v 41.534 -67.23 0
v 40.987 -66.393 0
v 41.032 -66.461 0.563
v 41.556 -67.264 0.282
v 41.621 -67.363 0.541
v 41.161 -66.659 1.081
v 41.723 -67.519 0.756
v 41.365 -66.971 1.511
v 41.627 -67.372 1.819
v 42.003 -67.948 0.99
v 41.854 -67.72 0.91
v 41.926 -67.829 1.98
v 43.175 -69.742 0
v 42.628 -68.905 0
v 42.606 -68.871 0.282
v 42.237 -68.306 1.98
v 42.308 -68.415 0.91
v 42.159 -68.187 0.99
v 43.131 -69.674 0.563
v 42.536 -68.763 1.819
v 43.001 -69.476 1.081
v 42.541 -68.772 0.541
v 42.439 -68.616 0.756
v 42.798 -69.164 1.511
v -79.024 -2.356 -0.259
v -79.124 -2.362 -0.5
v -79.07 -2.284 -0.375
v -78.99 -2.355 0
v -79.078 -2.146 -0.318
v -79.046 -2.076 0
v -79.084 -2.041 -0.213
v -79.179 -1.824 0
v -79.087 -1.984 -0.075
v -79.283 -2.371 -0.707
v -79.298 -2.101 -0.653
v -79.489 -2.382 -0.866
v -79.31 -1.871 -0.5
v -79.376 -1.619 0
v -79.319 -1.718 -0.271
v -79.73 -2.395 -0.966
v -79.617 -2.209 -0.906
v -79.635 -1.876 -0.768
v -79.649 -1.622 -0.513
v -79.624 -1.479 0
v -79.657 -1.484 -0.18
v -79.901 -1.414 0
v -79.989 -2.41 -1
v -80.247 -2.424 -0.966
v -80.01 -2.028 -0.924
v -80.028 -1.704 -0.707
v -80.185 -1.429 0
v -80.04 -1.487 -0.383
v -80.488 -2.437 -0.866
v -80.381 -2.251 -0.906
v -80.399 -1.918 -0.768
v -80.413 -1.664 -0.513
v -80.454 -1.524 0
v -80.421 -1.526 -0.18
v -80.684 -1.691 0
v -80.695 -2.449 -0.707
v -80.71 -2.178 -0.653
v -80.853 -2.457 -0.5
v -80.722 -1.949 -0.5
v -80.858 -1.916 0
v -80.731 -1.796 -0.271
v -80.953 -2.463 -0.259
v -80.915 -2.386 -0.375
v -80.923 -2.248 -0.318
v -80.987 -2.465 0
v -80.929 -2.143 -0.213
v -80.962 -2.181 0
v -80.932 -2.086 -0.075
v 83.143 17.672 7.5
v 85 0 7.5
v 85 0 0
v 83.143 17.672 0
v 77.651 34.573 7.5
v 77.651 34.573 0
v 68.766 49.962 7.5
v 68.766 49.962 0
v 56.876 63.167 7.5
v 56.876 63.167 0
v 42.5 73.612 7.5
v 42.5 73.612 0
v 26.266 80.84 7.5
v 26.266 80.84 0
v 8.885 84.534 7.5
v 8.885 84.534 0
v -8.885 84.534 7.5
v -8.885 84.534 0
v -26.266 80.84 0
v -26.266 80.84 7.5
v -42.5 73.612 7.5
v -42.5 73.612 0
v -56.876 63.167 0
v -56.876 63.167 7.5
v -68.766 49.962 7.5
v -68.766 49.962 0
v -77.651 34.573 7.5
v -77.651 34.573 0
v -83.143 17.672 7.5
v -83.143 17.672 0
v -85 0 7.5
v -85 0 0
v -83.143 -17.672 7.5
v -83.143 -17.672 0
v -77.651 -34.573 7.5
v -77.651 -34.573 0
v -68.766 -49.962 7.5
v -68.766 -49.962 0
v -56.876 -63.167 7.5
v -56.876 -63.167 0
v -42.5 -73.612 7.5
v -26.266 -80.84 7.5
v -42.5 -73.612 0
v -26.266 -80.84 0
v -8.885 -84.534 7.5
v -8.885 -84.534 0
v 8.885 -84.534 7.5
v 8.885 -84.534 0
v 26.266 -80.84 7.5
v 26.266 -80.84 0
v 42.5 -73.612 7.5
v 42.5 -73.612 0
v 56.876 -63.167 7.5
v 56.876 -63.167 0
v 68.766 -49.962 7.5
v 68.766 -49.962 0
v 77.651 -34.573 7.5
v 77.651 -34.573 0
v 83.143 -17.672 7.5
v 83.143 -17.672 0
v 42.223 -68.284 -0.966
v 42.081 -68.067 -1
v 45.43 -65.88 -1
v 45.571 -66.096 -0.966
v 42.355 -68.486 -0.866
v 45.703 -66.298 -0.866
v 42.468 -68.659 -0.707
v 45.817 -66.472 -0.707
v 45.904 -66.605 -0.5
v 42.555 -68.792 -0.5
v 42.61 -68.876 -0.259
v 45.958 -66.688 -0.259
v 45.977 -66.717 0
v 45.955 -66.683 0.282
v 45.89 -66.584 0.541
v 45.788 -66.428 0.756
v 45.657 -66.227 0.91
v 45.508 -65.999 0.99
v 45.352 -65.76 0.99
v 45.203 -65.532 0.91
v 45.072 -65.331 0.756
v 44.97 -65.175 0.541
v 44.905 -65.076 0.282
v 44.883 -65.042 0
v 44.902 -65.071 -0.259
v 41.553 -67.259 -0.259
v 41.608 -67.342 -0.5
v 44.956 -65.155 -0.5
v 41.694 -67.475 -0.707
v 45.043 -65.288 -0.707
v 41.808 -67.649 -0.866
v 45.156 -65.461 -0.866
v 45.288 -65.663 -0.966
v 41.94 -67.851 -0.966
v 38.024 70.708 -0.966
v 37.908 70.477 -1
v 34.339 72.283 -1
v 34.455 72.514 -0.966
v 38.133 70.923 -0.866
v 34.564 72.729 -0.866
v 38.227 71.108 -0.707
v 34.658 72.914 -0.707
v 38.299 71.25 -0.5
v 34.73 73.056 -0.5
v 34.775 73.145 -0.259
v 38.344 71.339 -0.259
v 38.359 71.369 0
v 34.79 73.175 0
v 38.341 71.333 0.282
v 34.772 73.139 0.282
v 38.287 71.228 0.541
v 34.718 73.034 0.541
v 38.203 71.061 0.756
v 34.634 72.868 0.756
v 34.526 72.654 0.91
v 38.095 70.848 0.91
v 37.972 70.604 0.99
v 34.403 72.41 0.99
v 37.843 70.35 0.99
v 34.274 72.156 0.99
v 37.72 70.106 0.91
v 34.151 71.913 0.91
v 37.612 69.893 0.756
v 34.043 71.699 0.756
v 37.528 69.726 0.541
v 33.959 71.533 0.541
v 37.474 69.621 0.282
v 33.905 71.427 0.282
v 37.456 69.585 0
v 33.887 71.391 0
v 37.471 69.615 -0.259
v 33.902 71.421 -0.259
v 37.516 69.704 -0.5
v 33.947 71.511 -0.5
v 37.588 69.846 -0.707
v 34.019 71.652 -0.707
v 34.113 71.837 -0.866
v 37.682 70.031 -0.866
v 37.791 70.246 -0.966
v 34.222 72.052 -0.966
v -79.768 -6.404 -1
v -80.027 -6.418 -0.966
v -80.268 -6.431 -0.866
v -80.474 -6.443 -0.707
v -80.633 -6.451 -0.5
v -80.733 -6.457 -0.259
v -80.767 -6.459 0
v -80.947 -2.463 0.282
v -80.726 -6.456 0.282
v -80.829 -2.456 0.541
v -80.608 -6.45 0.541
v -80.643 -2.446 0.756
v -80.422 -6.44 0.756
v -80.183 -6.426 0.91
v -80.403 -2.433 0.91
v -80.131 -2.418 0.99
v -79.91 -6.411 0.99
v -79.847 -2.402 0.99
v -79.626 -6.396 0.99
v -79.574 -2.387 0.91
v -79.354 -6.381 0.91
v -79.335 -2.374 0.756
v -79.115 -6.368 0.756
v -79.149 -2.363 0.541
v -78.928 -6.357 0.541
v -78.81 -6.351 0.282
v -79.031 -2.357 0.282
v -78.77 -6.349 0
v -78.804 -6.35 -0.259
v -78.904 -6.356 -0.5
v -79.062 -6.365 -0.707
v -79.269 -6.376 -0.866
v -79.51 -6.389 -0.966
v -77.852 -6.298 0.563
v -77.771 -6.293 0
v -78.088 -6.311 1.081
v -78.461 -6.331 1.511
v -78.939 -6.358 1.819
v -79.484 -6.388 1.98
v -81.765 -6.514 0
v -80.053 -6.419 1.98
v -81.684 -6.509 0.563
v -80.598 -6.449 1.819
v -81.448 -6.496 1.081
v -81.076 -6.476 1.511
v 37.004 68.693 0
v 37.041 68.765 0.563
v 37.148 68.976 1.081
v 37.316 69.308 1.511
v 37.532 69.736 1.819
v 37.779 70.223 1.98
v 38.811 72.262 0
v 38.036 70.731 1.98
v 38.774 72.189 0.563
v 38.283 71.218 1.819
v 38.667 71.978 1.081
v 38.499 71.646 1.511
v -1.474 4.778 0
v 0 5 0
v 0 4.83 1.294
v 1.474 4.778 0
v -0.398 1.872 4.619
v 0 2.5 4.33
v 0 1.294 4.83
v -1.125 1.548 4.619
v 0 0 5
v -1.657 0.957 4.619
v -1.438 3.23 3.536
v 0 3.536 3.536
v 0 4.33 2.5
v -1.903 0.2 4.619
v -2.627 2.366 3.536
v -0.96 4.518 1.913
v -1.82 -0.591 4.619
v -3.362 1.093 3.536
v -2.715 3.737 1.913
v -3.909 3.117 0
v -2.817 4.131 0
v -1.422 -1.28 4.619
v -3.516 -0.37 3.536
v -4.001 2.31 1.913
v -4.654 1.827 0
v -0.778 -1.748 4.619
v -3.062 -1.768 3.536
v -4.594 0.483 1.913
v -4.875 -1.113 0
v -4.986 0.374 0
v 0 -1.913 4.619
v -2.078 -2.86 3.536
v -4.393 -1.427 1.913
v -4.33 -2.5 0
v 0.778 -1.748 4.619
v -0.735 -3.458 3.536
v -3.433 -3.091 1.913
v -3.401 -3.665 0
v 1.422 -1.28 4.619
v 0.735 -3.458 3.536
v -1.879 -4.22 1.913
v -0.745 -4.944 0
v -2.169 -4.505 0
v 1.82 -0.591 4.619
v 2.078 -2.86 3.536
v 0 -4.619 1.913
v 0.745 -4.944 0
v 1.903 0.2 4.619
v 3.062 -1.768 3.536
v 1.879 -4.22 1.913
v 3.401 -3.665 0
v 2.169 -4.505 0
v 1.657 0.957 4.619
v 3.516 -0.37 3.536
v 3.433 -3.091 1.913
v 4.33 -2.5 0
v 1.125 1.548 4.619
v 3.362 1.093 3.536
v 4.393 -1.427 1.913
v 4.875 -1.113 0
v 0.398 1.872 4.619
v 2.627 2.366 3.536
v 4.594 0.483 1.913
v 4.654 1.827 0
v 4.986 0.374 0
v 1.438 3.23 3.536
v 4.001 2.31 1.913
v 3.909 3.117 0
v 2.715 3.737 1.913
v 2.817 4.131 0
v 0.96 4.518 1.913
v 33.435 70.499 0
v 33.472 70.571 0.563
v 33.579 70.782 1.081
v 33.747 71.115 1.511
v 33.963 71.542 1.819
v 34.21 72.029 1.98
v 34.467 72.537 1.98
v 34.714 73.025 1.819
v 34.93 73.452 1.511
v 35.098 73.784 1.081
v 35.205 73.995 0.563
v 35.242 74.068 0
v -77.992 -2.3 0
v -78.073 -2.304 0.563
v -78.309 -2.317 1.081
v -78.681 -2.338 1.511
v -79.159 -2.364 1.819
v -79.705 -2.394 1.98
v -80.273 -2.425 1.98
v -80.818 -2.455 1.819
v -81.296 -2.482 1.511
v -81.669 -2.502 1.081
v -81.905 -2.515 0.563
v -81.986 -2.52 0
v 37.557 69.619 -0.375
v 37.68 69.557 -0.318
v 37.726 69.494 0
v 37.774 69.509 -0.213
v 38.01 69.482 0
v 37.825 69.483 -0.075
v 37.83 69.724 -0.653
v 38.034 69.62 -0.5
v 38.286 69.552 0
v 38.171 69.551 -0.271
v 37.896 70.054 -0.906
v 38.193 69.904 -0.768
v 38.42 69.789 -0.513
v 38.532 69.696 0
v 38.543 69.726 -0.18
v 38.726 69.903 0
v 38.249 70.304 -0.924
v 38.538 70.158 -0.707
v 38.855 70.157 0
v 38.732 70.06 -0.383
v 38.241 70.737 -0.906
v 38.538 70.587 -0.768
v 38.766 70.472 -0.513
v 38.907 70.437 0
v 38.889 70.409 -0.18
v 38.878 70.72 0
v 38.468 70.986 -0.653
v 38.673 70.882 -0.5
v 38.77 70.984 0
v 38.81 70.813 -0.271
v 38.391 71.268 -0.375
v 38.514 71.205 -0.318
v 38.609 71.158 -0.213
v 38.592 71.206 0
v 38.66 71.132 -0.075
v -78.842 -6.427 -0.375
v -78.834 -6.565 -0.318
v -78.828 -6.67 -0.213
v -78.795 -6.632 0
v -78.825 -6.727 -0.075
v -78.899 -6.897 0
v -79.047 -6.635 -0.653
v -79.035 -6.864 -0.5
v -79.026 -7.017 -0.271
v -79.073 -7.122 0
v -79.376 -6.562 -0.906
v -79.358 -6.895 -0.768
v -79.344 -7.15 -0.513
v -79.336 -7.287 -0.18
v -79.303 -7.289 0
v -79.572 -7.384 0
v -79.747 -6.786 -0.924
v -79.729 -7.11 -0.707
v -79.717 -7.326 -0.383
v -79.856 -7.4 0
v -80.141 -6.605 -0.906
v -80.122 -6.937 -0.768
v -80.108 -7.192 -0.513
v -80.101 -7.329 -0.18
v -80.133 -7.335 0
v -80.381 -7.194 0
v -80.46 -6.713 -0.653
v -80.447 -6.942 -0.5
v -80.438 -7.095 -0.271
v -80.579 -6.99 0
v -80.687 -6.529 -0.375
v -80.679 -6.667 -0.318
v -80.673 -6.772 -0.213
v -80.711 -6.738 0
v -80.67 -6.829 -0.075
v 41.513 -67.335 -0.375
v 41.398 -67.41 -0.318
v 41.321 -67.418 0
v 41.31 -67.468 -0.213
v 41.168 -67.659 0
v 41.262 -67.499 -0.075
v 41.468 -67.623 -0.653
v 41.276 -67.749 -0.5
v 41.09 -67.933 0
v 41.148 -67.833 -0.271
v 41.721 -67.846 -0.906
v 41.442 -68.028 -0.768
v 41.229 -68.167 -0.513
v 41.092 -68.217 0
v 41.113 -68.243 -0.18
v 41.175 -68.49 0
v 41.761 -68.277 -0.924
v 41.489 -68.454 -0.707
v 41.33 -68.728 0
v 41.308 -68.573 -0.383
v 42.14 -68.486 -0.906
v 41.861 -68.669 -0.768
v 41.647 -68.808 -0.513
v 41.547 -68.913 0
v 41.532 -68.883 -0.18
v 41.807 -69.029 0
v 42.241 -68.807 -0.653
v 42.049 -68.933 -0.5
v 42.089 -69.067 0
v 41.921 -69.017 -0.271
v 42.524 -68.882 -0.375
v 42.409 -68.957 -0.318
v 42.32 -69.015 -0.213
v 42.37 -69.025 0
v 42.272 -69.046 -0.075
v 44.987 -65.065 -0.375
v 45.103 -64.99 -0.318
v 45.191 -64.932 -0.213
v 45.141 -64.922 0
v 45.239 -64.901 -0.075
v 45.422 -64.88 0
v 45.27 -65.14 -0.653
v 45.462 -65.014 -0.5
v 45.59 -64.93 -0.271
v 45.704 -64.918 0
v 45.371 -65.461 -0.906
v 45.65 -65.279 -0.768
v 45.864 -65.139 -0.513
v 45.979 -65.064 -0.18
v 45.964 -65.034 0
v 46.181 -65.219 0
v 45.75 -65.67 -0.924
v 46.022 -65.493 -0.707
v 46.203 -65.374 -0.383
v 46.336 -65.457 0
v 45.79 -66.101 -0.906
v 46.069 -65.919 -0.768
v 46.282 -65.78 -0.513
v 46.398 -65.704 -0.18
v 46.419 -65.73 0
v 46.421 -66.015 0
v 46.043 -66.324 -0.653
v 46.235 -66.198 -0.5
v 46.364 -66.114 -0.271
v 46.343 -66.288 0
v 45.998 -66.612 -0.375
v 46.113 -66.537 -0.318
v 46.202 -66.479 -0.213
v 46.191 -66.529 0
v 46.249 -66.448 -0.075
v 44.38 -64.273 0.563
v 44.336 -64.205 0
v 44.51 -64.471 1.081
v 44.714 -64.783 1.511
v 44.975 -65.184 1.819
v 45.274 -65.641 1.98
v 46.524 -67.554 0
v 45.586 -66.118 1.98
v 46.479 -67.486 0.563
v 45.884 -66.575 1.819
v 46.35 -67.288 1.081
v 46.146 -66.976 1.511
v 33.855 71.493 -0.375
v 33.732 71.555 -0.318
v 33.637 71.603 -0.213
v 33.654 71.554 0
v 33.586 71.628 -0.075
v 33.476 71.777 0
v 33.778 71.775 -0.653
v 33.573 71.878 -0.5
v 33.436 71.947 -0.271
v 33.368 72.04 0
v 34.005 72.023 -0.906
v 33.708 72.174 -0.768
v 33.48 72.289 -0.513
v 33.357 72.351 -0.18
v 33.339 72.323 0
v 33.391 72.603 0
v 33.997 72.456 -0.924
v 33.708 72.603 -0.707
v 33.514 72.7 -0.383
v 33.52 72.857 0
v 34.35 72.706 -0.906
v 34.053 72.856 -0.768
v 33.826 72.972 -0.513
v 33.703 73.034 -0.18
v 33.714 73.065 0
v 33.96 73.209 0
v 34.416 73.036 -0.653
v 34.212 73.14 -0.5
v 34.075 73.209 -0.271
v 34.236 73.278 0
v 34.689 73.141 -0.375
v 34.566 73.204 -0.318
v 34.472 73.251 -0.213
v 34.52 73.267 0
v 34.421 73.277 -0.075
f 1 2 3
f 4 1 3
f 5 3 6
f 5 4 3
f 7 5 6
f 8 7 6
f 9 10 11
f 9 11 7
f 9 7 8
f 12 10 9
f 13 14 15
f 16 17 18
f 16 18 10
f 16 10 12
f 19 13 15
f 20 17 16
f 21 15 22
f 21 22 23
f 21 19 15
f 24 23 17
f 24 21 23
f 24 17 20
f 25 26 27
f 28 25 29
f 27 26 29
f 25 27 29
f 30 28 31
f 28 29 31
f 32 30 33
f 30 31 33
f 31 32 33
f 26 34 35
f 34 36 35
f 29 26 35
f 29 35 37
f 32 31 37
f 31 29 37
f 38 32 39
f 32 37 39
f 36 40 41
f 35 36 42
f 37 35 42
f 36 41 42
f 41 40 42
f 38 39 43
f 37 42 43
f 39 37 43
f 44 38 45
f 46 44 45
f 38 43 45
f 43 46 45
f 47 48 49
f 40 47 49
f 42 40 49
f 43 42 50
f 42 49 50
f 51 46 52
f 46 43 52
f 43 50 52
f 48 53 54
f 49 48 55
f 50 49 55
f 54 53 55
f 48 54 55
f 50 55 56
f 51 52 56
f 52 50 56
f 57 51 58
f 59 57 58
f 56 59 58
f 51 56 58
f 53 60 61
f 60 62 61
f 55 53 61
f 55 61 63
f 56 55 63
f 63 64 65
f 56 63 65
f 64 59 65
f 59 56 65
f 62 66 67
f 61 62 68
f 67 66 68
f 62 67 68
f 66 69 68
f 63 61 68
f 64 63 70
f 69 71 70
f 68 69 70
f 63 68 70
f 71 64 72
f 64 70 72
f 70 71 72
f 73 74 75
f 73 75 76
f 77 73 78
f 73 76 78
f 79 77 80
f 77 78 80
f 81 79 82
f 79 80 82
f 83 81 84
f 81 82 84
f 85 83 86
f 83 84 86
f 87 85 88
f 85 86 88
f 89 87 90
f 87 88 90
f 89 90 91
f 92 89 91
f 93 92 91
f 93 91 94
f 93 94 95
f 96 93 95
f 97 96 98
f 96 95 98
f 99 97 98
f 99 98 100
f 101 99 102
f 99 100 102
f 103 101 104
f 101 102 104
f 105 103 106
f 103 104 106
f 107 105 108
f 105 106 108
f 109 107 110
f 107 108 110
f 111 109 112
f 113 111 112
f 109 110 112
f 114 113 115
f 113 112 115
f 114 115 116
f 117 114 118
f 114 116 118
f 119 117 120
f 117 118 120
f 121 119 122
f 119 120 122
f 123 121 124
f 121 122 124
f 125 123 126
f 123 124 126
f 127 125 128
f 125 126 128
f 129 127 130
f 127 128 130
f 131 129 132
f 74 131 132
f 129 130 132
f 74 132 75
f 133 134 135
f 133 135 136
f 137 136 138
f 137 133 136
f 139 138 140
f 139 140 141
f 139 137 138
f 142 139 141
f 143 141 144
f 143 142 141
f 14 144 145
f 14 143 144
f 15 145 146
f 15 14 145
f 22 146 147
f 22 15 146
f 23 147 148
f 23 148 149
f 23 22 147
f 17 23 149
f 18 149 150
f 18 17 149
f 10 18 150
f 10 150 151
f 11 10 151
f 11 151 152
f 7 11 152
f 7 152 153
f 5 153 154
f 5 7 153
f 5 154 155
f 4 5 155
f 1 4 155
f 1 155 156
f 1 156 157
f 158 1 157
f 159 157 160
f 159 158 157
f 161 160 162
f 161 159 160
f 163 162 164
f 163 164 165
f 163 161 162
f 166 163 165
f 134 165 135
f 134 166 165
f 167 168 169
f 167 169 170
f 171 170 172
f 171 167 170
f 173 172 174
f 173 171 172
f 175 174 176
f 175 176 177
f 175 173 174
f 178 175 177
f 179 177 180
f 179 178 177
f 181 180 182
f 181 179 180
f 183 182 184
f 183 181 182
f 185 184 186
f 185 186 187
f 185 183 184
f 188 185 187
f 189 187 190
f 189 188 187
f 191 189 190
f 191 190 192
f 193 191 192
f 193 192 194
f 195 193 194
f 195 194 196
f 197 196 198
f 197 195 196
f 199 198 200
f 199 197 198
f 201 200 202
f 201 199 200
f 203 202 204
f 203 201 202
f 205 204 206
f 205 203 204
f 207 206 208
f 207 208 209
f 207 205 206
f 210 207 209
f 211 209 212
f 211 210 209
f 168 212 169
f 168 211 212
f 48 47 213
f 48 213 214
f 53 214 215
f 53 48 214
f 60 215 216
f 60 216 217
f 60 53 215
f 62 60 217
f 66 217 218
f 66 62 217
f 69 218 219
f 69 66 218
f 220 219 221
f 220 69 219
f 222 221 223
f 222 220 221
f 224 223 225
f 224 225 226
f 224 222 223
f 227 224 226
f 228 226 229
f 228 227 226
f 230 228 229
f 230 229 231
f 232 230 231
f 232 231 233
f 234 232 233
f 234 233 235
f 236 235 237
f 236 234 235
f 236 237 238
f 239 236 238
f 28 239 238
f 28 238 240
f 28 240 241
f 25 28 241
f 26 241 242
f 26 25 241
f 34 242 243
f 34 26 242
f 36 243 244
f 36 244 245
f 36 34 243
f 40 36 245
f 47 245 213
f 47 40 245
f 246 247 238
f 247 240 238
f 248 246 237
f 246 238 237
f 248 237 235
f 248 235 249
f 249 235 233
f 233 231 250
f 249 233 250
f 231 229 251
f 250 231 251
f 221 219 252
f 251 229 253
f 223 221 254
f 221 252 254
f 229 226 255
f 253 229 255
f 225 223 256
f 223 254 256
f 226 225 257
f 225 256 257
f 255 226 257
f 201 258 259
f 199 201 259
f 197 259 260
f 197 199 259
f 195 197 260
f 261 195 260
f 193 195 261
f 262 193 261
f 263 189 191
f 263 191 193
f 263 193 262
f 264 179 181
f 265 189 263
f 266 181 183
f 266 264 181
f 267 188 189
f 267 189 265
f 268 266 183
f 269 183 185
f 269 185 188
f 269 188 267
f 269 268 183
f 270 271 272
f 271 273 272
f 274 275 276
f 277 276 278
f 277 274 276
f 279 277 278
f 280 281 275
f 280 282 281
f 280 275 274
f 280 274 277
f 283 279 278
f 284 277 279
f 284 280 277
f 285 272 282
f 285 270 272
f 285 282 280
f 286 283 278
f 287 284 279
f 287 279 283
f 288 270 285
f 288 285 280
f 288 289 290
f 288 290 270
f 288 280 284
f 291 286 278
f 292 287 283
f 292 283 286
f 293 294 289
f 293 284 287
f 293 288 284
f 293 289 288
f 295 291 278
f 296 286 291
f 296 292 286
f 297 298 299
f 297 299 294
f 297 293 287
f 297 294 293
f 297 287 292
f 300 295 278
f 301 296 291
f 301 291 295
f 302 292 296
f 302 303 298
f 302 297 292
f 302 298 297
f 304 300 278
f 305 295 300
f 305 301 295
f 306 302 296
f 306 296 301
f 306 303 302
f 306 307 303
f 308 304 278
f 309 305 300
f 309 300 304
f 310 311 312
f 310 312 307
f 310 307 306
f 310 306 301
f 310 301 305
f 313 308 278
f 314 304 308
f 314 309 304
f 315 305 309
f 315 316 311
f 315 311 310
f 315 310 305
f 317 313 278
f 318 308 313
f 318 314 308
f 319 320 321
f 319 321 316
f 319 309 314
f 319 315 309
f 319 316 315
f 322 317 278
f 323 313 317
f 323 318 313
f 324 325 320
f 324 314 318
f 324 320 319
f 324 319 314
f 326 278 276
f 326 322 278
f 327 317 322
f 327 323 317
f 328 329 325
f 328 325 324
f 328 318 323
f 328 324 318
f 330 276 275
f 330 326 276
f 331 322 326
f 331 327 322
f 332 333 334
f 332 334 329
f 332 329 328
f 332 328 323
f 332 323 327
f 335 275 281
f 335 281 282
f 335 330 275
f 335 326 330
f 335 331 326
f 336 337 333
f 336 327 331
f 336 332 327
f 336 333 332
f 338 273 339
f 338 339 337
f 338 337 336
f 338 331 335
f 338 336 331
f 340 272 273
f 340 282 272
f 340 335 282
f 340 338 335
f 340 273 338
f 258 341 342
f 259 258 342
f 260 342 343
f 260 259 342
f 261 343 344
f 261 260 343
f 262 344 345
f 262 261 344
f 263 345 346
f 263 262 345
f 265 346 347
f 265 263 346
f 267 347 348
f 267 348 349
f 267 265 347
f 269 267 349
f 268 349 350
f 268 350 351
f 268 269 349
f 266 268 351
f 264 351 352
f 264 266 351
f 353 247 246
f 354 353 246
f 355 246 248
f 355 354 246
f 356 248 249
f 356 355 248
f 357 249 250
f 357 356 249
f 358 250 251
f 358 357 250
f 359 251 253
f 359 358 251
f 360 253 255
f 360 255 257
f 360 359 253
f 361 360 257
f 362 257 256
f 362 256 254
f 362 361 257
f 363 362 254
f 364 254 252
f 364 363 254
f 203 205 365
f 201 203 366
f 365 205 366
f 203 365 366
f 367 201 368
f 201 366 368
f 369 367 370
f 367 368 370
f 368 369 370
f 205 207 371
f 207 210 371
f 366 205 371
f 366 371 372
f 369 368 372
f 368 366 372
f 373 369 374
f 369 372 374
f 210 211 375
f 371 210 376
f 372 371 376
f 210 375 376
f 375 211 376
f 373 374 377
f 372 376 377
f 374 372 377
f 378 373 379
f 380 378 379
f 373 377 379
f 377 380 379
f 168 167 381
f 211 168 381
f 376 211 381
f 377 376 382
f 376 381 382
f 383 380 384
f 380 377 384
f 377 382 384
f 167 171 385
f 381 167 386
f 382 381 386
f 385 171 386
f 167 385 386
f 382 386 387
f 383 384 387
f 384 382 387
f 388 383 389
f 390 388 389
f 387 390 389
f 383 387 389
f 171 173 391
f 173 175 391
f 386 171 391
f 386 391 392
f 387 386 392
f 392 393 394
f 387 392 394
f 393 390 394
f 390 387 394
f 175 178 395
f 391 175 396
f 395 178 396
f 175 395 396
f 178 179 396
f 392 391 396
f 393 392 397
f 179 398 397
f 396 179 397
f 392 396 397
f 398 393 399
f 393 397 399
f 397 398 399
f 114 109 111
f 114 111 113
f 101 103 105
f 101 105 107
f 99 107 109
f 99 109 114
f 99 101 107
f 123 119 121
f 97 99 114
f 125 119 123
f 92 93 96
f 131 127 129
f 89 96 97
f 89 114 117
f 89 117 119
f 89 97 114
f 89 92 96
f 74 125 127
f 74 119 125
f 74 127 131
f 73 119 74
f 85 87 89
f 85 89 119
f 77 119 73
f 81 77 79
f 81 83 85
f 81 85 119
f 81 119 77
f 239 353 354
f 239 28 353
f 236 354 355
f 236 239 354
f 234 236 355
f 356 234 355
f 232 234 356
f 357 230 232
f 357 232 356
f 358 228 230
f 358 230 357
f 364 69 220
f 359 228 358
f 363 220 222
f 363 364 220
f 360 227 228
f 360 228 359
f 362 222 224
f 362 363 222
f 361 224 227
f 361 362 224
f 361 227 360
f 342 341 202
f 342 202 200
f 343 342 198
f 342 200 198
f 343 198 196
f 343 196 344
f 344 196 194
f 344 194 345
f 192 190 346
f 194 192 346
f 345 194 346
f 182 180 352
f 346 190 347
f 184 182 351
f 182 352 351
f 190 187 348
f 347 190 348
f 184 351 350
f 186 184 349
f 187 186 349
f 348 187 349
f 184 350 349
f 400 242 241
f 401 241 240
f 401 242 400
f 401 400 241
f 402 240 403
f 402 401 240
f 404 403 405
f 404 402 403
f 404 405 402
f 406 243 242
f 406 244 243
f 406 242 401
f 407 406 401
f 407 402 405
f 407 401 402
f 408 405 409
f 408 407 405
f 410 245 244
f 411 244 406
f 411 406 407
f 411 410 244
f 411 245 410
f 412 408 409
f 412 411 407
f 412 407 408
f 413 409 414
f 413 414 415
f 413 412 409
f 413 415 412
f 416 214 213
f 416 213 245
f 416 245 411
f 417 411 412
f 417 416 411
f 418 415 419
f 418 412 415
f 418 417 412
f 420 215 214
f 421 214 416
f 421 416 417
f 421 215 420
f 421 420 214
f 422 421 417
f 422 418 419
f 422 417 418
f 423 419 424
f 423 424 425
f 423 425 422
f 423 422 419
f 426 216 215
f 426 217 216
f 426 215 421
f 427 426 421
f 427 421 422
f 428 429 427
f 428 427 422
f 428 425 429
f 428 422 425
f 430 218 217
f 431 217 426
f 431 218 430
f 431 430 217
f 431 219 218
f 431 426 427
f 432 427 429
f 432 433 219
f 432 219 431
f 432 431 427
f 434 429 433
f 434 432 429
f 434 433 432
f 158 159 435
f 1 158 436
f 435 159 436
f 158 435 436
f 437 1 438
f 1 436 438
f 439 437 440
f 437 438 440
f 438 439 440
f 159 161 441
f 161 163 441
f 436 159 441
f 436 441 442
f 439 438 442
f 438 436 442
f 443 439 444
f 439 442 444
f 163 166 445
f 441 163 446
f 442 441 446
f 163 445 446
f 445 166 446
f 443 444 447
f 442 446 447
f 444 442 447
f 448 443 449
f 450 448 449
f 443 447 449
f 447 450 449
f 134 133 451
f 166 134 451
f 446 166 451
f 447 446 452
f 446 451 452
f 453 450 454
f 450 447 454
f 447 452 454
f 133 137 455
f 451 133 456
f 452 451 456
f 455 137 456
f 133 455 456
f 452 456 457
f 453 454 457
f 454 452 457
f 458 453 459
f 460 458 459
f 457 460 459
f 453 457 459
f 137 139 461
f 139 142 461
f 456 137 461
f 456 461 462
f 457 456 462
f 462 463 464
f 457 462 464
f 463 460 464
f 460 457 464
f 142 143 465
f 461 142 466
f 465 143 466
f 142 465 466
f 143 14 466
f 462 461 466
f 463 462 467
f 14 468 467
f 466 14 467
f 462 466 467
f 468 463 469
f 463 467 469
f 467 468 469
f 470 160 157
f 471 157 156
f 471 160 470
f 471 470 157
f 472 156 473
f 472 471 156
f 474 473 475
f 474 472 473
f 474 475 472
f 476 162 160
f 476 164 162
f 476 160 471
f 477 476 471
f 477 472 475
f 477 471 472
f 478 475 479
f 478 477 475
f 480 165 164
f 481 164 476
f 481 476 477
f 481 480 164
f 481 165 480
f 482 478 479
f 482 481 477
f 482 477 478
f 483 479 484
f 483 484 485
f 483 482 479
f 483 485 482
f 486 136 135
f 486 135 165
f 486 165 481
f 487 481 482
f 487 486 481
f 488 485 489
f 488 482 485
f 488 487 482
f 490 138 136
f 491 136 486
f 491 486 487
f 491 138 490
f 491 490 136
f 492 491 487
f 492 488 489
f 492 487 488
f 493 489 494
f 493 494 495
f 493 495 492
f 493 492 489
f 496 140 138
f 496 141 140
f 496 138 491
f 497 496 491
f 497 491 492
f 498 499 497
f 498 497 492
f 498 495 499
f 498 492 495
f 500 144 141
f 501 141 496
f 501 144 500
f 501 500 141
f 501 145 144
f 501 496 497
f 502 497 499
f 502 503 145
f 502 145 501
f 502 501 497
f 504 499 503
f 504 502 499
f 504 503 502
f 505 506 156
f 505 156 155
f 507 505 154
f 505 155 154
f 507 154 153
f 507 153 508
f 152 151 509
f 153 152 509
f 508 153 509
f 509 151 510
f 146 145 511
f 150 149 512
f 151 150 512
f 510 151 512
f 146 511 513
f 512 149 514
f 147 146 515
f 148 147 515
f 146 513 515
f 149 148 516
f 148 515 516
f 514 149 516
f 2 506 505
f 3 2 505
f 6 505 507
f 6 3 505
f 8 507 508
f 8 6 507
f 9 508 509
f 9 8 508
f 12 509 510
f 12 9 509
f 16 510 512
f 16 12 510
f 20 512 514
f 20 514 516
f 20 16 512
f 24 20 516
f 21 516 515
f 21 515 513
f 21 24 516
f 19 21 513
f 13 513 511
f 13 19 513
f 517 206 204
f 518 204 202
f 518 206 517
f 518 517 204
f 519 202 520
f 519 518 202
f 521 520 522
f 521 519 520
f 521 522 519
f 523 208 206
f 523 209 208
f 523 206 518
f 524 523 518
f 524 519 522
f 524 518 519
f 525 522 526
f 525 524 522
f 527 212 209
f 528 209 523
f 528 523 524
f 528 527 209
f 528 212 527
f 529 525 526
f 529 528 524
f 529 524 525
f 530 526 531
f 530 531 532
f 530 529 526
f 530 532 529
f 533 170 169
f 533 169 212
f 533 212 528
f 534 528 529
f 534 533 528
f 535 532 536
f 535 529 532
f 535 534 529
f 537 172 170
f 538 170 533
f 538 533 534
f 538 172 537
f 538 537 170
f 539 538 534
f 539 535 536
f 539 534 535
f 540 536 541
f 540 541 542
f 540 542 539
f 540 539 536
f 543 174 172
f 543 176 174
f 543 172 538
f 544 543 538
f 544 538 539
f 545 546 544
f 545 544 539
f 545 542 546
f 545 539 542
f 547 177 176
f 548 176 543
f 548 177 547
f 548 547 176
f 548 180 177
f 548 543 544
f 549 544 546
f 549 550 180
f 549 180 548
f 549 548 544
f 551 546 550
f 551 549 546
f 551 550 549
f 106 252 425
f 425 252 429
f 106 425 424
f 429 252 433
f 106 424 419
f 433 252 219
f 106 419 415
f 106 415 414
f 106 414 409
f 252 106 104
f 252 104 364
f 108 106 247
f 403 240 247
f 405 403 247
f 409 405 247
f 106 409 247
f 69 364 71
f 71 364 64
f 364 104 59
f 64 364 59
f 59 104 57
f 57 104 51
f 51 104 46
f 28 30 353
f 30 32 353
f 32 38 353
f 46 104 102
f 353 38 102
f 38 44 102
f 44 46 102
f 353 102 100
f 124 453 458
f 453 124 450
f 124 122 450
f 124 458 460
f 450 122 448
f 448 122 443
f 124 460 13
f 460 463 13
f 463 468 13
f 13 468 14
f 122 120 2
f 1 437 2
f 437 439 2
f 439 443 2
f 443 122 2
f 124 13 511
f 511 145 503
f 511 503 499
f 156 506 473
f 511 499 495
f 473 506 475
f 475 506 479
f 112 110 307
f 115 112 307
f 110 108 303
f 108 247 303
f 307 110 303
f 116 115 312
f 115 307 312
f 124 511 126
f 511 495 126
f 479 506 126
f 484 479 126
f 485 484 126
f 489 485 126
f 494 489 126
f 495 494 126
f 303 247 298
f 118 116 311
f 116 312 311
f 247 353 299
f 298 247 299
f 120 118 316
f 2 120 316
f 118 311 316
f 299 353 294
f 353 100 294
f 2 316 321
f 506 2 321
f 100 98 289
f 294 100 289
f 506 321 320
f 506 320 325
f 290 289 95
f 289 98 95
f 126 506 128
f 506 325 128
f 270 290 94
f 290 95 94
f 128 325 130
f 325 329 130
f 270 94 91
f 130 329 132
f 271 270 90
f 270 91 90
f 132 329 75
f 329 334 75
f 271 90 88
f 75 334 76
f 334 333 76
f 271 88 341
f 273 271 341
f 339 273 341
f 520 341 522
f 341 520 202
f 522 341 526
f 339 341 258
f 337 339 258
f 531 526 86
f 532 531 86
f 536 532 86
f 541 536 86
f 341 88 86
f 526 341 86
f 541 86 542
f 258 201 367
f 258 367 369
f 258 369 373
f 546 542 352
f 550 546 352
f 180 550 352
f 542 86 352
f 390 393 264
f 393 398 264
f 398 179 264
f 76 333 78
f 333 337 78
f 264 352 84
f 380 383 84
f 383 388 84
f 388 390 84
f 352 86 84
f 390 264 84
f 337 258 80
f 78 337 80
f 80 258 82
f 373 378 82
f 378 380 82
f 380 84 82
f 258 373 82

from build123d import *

# Parameters (mm, degrees)
SKETCH1_R                = 85
BOSS_EXTRUDE1_DEPTH      = 7.5
CUT_EXTRUDE1_DEPTH       = 2
SKETCH4_R                = 1
BOSS_EXTRUDE2_DEPTH      = 2
REVOLVE1_ANGLE           = 90
CIRPATTERN1_COUNT        = 3
CIRPATTERN1_COPY_1_ANGLE = 90
CIRPATTERN1_COPY_2_ANGLE = 90


with BuildPart() as part:
    # Sketch1 → Boss-Extrude1 (new body)
    with BuildSketch(Plane.XY):
        Circle(SKETCH1_R)
    extrude(amount=BOSS_EXTRUDE1_DEPTH)

    # Sketch3 → Cut-Extrude1 (cut, symmetric)
    with BuildSketch(Plane(origin=(0, 0, -92.825007953), x_dir=(0, 0, -1), z_dir=(-0.8371691043312235, -0.5469441386039866, 0))):
        with BuildLine():
            Line((-92.825007953, 82), (-92.825007953, 78))
            ThreePointArc((-92.825007953, 78), (-94.825007953, 80), (-92.825007953, 82))
        make_face()
    cut_extrude1 = extrude(amount=CUT_EXTRUDE1_DEPTH, both=True, mode=Mode.SUBTRACT)

    # Sketch4 → Boss-Extrude2 (add, symmetric)
    with BuildSketch(Plane(origin=(0, 0, -92.825007953), x_dir=(0, 0, -1), z_dir=(-0.8371691043312235, -0.5469441386039866, 0))):
        with Locations((-92.825007953, 80)):
            Circle(SKETCH4_R)
    boss_extrude2 = extrude(amount=BOSS_EXTRUDE2_DEPTH, both=True)

    # Sketch5 → Revolve1 (revolve)
    with BuildSketch(Plane(origin=(-1.674338209, -1.093888277, 0), x_dir=(0, 0, -1), z_dir=(-0.8371691043312235, -0.5469441386039867, 0))):
        with BuildLine():
            ThreePointArc((0, 79), (1, 80), (0, 81))
            Line((0, 81), (0, 79))
        make_face()
    revolve1 = revolve(axis=Axis((42.628137018, -68.904585728, 0), (-0.5469441386039868, 0.8371691043312235, 0)), revolution_arc=REVOLVE1_ANGLE)

    # Mirror1: Revolve1 across plane
    add(revolve1.mirror(Plane(origin=(0, 0, 0), x_dir=(0, 0, 1), z_dir=(0.8371691043312218, 0.5469441386039892, -2.013840245446376e-15))))

    # CirPattern1: Cut-Extrude1, Boss-Extrude2, Revolve1 ×3 about axis
    cirpattern1_axis = Axis((0, 0, 7.5), (0, 0, -1))
    add([cut_extrude1.rotate(cirpattern1_axis, i * 360 / CIRPATTERN1_COUNT) for i in range(1, CIRPATTERN1_COUNT)], mode=Mode.SUBTRACT)
    add([boss_extrude2.rotate(cirpattern1_axis, i * 360 / CIRPATTERN1_COUNT) for i in range(1, CIRPATTERN1_COUNT)])
    add([revolve1.rotate(cirpattern1_axis, i * 360 / CIRPATTERN1_COUNT) for i in range(1, CIRPATTERN1_COUNT)])

    # CirPattern1 copy 1 sketch → CirPattern1 copy 1 (revolve)
    with BuildSketch(Plane(origin=(0.110165933, -1.996963562, 0), x_dir=(0, 0, -1), z_dir=(0.055082966316444104, -0.9984817809162979, -4.022974273625351e-15))):
        with BuildLine():
            ThreePointArc((0, -79), (1, -80), (0, -81))
            Line((0, -81), (0, -79))
        make_face()
    revolve(axis=Axis((-80.766858322, -6.458683833, 0), (-0.9984817809162977, -0.05508296631644394, 0)), revolution_arc=CIRPATTERN1_COPY_1_ANGLE)

    # CirPattern1 copy 2 sketch → CirPattern1 copy 2 (revolve)
    with BuildSketch(Plane(origin=(-1.784504141, 0.903075285, 0), x_dir=(0, 0, -1), z_dir=(-0.8922520706476645, 0.45153764231230564, -4.022974273625351e-15))):
        with BuildLine():
            ThreePointArc((0, -79), (1, -80), (0, -81))
            Line((0, -81), (0, -79))
        make_face()
    revolve(axis=Axis((34.790044886, 73.175493007, 0), (0.45153764231230564, 0.8922520706476642, 0)), revolution_arc=CIRPATTERN1_COPY_2_ANGLE)

    # Sketch6 → Cut-Revolve1 (revolve, cut)
    with BuildSketch(Plane(origin=(0, 0, 0), x_dir=(0, 0, -1), z_dir=(1, 0, 0))):
        with BuildLine():
            Line((5, 0), (-5, 0))
            ThreePointArc((-5, 0), (0, 5), (5, 0))
        make_face()
    revolve(axis=Axis((0, 0, -5), (0, 0, 1)), mode=Mode.SUBTRACT)


solid = part.part
